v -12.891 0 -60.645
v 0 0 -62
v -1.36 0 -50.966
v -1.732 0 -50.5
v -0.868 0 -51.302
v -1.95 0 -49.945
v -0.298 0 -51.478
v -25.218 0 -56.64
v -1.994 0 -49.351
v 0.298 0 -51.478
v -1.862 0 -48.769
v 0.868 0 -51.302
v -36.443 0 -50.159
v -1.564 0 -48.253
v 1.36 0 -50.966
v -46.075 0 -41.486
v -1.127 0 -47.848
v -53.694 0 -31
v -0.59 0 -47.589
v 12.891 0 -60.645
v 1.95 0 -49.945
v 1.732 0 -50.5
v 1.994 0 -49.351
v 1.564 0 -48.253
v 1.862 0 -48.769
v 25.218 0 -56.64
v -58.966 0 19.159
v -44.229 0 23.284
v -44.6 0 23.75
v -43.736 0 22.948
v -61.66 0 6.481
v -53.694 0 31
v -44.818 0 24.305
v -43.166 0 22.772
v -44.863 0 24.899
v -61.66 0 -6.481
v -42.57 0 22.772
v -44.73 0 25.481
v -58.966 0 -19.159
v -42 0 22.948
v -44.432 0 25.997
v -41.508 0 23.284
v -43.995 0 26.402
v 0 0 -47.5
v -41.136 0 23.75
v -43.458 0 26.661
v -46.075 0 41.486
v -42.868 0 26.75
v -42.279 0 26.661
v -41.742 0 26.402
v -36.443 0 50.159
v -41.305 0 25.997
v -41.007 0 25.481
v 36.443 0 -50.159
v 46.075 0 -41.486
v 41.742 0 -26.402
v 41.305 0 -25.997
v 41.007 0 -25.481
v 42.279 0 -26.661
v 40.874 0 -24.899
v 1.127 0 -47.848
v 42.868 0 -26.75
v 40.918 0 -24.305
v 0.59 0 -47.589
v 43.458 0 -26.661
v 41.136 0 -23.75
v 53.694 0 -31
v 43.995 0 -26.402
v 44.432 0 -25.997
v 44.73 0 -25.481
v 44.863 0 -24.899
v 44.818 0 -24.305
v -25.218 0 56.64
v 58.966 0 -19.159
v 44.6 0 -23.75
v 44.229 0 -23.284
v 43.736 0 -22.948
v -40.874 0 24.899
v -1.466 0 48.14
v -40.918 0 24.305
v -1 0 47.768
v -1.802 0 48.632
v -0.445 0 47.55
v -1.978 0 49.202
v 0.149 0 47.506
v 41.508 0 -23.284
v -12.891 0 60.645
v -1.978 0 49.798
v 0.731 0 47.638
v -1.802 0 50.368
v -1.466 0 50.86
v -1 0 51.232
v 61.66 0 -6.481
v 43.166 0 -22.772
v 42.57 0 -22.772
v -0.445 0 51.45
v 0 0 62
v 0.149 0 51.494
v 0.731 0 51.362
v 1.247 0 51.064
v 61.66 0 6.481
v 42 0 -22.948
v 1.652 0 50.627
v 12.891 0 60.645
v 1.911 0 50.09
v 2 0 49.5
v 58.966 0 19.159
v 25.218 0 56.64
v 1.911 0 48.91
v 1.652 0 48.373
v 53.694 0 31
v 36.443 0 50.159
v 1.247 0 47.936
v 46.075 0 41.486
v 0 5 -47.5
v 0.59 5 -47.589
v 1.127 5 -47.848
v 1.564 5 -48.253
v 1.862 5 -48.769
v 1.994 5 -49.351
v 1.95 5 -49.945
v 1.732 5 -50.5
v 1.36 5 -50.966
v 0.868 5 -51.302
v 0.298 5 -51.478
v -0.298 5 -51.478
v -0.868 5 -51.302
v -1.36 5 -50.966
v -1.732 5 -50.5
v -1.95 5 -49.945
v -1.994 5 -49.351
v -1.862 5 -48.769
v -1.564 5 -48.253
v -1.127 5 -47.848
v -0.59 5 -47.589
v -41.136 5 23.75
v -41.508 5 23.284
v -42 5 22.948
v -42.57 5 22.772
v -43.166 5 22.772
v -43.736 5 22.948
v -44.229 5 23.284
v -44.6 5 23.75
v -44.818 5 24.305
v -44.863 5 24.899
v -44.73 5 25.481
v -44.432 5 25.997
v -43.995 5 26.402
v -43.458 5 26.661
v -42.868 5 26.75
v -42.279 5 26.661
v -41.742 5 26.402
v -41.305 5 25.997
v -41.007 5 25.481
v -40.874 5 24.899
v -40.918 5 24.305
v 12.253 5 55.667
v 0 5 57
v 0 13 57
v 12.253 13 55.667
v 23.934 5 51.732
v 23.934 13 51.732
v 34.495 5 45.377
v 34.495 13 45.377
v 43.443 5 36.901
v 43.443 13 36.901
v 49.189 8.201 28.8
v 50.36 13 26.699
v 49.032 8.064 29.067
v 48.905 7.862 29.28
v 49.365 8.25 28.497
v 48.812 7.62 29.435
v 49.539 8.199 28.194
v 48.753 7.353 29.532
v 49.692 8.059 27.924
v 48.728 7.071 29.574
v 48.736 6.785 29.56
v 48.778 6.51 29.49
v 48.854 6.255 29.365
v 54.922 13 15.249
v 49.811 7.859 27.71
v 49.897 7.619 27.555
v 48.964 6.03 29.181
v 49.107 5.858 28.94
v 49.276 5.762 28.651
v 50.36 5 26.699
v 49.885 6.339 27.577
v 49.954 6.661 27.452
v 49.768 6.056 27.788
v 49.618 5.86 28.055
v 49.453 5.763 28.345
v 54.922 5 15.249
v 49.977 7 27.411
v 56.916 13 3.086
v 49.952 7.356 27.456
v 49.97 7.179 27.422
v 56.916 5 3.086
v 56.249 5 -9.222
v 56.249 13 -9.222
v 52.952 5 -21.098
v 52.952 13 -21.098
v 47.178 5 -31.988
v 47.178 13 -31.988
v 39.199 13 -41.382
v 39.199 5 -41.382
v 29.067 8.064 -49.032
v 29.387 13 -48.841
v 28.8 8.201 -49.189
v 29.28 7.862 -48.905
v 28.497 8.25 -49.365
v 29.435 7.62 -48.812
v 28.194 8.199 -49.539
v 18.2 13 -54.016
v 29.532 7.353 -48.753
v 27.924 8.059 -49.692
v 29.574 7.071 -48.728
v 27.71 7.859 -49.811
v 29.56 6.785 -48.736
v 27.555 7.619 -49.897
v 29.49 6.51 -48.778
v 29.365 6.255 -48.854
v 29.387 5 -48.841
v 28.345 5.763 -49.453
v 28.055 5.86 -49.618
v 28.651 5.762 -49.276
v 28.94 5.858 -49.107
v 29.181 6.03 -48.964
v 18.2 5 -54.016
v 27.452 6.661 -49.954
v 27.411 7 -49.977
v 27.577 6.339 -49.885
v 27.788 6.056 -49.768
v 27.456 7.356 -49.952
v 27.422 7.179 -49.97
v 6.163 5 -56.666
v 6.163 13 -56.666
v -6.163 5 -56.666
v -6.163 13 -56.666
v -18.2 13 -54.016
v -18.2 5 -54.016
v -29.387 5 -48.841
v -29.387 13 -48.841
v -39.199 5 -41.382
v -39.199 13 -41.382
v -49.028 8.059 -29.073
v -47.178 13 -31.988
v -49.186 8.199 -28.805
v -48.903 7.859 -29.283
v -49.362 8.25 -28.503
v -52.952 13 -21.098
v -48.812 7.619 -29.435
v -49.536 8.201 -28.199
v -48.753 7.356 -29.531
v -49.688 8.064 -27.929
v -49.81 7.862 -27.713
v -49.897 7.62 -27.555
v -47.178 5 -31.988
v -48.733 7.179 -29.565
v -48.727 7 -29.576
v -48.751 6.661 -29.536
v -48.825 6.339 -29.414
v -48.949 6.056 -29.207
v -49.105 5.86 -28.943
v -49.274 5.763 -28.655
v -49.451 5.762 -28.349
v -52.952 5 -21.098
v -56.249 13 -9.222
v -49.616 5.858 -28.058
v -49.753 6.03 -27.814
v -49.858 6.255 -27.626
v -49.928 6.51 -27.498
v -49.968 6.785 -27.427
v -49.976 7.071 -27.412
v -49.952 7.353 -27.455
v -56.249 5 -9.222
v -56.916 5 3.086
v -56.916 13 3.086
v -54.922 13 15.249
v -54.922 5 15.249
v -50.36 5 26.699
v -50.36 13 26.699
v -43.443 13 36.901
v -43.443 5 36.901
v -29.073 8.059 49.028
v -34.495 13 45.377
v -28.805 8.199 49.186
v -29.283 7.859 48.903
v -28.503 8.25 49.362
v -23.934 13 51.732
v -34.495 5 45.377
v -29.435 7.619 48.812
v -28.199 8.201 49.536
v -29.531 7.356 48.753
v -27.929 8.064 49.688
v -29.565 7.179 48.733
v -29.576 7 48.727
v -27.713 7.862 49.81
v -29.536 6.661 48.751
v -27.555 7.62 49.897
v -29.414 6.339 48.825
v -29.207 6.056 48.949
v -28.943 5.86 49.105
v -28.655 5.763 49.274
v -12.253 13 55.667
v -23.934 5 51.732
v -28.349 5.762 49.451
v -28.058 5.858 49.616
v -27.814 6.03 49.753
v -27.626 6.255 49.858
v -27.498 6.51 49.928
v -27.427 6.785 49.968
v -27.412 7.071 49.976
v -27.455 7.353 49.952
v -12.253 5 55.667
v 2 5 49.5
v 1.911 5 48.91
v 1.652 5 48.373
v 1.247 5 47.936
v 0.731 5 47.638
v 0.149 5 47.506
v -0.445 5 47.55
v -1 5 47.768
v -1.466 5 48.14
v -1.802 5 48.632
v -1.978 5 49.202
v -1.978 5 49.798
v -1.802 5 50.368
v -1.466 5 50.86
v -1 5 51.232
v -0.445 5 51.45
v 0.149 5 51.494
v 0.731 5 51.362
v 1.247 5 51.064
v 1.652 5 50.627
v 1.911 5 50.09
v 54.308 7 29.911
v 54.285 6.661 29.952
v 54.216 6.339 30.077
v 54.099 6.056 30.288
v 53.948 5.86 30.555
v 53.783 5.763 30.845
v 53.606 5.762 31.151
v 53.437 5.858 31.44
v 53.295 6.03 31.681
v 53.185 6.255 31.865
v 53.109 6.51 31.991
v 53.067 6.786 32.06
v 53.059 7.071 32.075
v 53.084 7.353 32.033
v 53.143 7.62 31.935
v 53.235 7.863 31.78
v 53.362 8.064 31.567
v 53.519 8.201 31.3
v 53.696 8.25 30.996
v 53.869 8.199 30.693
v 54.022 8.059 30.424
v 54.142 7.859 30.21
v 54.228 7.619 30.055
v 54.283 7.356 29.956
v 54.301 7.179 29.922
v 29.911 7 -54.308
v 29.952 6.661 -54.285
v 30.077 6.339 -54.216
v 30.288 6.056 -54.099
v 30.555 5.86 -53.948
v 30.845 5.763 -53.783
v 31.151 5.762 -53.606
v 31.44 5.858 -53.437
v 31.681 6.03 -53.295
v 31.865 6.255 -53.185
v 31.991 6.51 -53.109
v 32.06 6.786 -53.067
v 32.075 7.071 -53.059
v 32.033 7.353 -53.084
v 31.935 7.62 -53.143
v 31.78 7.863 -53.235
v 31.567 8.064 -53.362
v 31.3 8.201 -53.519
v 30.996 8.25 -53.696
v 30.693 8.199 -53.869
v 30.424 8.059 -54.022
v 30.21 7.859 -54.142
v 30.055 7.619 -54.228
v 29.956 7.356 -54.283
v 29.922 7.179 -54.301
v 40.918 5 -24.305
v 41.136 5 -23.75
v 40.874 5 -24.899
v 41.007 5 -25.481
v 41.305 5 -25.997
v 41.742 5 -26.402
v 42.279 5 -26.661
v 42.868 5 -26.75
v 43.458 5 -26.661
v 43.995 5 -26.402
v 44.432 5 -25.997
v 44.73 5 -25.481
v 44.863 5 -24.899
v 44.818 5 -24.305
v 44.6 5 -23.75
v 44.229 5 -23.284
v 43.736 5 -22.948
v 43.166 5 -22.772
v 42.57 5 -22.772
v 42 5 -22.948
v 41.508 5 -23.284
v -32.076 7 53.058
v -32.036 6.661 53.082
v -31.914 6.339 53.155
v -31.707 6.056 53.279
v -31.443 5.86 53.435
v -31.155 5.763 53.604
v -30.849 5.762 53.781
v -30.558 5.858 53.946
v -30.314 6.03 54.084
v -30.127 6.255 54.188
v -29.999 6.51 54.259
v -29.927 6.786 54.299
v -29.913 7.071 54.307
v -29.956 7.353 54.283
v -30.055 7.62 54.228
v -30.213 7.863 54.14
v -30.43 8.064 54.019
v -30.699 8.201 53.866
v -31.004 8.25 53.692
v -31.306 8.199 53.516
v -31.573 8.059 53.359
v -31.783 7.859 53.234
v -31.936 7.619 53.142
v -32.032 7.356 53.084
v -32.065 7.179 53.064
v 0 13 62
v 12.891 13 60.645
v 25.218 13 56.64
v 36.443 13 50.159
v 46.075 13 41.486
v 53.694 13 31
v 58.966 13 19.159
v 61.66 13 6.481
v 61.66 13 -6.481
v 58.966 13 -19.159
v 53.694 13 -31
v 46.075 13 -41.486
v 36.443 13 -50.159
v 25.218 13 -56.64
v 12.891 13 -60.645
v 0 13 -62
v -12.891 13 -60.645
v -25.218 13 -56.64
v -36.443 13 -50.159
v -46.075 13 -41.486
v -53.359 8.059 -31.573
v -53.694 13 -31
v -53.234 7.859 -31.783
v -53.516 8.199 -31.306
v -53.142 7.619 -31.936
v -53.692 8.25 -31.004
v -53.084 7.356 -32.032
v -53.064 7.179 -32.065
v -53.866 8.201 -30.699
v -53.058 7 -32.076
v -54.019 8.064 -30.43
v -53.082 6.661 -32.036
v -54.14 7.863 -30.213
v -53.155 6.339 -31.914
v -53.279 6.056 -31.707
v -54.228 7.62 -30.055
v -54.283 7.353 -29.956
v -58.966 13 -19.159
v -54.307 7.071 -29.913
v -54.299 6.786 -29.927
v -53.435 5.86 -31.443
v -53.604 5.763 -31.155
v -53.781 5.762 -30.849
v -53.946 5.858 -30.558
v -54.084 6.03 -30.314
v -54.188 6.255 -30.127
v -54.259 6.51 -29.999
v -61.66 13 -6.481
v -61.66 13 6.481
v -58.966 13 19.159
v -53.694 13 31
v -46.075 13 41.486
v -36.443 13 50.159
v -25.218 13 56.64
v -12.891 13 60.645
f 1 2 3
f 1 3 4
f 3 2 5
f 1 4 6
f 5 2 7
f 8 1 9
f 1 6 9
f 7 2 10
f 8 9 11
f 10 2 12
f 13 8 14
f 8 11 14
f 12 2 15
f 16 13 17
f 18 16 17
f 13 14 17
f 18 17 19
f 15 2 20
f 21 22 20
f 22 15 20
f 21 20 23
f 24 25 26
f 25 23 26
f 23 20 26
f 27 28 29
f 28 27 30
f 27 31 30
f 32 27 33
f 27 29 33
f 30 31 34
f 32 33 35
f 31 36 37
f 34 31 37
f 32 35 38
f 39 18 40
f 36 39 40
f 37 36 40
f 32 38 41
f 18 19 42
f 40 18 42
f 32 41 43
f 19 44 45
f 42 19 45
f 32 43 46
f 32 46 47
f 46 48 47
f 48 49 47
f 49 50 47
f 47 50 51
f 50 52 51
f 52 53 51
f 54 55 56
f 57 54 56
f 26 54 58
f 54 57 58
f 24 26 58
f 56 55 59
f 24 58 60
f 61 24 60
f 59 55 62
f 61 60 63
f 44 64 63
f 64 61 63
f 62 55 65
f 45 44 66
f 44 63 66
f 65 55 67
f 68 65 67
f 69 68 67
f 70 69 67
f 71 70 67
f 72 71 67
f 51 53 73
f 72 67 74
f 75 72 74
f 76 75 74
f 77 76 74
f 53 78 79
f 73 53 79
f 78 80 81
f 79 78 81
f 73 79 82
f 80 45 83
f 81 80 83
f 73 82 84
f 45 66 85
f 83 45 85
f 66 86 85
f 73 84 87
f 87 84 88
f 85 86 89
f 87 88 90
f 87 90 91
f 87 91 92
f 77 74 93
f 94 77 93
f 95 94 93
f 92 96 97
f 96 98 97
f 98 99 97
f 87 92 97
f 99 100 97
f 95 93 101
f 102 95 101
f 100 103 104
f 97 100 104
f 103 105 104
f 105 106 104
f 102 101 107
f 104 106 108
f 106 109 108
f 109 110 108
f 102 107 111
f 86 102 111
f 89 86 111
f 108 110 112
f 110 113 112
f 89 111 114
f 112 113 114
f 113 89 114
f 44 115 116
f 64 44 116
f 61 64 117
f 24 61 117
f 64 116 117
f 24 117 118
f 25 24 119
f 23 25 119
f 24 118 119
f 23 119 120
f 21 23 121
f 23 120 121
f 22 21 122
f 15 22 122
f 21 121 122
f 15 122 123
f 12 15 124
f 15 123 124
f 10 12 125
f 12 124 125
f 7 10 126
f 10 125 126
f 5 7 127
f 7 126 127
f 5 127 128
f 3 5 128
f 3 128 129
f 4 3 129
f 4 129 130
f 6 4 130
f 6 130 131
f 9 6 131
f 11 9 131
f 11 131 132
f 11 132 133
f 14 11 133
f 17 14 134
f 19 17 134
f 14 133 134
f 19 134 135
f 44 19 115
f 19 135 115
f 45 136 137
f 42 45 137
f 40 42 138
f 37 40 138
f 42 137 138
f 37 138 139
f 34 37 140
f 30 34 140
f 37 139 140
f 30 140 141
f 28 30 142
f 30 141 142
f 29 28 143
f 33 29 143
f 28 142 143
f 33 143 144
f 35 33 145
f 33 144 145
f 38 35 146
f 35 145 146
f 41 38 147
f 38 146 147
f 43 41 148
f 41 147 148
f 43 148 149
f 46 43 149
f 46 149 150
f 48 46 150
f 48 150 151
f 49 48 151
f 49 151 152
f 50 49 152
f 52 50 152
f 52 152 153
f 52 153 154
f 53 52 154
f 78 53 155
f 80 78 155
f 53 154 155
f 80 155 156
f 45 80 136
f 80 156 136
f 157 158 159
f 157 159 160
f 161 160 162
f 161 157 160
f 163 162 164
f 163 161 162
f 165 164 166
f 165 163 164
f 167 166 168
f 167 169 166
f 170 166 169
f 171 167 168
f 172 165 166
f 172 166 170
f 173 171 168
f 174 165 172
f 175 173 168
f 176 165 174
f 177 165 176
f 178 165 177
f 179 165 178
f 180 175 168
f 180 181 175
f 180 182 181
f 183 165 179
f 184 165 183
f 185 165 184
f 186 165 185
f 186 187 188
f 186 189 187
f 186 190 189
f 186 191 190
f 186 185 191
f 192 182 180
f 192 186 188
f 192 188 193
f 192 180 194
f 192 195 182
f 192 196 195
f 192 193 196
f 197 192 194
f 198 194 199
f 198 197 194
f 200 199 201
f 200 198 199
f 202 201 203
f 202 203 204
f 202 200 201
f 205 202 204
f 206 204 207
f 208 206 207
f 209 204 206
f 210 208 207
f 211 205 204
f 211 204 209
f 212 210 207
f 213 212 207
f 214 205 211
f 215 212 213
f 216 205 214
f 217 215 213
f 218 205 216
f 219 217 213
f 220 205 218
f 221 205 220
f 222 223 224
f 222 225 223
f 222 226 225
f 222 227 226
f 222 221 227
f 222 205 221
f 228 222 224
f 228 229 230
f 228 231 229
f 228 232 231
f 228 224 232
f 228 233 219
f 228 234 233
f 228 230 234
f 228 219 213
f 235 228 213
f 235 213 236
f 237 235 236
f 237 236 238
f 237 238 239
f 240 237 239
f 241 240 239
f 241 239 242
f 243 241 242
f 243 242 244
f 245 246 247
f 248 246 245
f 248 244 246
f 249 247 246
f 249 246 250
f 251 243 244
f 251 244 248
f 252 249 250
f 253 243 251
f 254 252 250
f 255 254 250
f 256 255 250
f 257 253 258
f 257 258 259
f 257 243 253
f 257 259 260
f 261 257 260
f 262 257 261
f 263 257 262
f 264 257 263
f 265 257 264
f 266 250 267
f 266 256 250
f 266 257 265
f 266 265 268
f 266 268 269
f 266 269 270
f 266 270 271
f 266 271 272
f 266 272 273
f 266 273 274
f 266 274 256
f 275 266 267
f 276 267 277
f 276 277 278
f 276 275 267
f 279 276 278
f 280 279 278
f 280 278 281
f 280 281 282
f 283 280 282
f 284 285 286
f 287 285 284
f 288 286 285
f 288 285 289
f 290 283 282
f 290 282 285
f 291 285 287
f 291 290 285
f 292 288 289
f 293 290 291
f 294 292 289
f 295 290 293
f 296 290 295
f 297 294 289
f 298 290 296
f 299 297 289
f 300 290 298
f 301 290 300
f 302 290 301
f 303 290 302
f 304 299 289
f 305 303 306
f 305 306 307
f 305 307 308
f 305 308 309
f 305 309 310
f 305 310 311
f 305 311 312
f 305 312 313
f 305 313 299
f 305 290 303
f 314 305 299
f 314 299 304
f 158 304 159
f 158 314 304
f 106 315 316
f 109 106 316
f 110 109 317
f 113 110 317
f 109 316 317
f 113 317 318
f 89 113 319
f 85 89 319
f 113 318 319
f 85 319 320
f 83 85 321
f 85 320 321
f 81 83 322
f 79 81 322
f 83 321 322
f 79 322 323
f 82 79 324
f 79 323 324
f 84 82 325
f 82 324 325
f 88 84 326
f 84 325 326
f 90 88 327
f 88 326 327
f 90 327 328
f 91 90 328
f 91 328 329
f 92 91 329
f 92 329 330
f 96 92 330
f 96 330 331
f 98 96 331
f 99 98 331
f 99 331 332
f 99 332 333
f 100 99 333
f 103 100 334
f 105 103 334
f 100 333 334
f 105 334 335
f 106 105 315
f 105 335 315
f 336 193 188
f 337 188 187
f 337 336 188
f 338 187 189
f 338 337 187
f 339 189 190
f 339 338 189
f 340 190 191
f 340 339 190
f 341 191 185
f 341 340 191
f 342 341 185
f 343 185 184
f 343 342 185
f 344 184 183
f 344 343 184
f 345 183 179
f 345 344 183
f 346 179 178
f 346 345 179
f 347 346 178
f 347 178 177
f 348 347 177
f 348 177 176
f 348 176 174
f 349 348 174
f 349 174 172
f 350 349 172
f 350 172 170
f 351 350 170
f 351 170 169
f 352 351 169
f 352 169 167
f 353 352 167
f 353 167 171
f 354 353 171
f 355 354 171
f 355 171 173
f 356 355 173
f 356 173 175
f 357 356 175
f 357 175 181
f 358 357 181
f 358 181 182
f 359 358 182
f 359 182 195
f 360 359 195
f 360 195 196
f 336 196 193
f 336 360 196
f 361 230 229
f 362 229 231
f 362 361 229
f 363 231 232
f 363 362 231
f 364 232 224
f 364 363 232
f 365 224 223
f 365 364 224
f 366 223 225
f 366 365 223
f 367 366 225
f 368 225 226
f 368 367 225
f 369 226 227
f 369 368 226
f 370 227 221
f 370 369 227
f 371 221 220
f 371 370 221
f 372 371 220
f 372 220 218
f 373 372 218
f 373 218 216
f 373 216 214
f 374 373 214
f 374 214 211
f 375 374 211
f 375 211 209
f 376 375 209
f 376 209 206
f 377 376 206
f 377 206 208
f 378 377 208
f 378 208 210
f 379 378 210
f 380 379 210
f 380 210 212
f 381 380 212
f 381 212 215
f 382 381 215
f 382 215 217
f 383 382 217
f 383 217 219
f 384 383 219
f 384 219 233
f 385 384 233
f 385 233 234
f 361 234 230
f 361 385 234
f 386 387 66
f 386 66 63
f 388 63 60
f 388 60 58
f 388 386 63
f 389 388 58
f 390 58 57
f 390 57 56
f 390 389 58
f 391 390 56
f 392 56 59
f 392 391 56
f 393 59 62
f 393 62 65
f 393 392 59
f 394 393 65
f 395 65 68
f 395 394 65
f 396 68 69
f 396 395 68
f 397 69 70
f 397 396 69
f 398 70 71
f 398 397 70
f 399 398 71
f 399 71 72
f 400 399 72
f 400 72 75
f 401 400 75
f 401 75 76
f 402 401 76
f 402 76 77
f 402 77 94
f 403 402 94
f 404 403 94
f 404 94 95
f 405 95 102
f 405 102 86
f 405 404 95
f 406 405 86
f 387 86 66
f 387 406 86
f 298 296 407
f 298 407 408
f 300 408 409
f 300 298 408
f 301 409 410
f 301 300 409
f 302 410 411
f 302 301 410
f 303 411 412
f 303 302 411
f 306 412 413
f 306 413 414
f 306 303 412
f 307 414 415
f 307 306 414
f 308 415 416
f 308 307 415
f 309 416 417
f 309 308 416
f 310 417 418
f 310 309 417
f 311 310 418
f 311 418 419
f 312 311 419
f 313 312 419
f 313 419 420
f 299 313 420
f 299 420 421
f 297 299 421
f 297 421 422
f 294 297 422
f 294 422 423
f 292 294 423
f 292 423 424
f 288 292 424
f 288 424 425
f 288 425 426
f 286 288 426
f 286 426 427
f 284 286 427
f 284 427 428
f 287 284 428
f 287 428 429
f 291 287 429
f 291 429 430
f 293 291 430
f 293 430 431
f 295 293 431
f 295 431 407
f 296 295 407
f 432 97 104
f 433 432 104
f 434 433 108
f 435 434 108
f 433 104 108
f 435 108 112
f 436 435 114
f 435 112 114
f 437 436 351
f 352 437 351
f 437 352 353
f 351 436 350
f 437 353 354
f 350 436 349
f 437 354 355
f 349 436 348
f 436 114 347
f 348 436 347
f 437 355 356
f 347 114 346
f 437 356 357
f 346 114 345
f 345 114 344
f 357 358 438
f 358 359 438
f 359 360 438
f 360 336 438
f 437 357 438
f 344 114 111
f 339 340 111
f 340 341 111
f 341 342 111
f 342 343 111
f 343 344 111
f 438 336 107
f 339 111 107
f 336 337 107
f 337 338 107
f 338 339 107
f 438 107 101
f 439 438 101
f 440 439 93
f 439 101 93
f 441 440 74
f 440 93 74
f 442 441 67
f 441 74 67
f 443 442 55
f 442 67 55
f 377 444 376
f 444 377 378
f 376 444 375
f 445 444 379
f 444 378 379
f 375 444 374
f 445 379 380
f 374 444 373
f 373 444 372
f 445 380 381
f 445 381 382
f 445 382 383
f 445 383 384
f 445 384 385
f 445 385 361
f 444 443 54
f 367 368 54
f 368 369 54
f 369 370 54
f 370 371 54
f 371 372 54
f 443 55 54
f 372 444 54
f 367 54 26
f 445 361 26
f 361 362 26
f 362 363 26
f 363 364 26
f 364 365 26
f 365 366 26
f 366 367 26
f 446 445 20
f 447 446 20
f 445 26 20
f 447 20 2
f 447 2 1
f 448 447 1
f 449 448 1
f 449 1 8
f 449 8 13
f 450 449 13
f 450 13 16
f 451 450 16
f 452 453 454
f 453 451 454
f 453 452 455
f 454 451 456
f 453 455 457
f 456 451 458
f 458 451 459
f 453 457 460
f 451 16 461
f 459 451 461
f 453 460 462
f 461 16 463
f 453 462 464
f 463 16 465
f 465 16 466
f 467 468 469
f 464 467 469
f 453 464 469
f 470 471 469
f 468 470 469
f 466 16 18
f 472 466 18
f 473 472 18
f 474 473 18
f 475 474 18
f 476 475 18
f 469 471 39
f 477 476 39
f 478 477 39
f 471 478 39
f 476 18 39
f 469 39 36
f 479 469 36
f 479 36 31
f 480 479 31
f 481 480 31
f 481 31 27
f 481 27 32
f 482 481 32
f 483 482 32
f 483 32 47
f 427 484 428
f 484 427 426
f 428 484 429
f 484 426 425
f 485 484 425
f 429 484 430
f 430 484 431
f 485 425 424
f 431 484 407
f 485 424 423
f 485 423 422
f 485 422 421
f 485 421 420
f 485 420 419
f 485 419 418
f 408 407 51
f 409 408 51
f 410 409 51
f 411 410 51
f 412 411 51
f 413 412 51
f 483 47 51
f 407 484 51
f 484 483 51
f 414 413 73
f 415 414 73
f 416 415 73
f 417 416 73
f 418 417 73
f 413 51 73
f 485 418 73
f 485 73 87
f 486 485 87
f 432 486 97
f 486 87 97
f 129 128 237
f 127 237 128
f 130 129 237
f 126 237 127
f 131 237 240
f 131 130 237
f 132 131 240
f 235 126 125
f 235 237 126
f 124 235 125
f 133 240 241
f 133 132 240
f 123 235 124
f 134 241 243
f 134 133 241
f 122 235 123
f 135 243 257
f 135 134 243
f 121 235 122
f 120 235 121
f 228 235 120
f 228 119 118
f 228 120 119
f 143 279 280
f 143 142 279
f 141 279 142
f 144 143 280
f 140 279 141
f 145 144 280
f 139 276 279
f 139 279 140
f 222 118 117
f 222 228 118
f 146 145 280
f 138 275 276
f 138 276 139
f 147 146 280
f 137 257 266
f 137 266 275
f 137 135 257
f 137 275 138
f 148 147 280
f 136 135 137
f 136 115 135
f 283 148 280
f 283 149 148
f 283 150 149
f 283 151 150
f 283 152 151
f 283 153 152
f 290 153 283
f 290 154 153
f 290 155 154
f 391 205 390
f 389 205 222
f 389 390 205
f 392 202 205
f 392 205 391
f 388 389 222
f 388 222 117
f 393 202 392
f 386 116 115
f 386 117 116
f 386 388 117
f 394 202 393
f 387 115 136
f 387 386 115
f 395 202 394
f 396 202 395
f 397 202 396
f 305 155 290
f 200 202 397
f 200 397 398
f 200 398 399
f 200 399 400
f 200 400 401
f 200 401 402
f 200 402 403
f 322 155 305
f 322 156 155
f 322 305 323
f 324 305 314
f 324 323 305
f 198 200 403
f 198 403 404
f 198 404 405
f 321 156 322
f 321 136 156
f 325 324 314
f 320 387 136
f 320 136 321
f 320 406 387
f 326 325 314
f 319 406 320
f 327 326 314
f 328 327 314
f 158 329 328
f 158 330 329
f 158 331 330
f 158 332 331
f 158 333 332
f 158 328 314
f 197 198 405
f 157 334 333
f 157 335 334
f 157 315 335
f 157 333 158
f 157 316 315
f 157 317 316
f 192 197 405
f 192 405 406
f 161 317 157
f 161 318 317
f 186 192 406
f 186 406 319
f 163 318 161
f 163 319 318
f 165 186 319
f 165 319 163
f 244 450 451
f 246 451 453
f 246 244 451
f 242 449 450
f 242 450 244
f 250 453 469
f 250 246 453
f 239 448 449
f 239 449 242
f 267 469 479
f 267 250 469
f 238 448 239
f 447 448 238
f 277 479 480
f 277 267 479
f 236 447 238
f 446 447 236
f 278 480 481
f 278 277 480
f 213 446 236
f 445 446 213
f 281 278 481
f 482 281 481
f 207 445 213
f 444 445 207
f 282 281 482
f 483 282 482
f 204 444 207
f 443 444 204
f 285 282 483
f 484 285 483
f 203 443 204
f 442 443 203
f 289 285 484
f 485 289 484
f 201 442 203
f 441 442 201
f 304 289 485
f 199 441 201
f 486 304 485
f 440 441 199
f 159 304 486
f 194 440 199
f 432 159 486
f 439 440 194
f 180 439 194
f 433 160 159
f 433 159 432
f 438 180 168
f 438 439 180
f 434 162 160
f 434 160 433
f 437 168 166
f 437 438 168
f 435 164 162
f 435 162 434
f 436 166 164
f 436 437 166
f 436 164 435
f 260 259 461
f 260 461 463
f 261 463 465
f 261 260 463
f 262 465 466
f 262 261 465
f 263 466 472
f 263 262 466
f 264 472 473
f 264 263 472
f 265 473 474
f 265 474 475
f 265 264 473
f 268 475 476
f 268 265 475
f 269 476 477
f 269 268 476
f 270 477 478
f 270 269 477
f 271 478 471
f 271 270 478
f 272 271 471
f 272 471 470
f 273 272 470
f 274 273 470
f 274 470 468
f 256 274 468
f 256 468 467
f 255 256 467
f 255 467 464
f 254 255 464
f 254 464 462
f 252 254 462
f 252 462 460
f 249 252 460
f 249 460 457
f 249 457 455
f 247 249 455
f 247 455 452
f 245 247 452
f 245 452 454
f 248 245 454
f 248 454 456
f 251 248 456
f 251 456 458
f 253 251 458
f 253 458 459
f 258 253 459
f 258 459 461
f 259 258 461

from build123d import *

# Parameters (mm, degrees)
SKETCH1_R               = 62
BOSS_EXTRUDE1_DEPTH     = 5
SKETCH2_R               = 2
CUT_EXTRUDE1_DEPTH      = 5
CIRPATTERN1_COUNT       = 2
CIRPATTERN1_ANGLE       = 120
MIRROR1_COPY_1_SKETCH_R = 2
MIRROR1_COPY_1_DEPTH    = 5
SKETCH5_R               = 62
SKETCH5_R_2             = 57
BOSS_EXTRUDE2_DEPTH     = 8
CUT_EXTRUDE2_START      = -90
SKETCH6_R               = 1.25
CUT_EXTRUDE2_DEPTH      = 192
CIRPATTERN2_COUNT       = 2
CIRPATTERN2_ANGLE       = 90


with BuildPart() as part:
    # Sketch1 → Boss-Extrude1 (new body)
    with BuildSketch(Plane(origin=(0, 0, 0), x_dir=(1, 0, 0), z_dir=(0, 1, 0))):
        with Locations(Location((0, 0, 0), (0, 0, 270))):
            Circle(SKETCH1_R)
    extrude(amount=BOSS_EXTRUDE1_DEPTH)

    # Sketch2 → Cut-Extrude1 (cut)
    with BuildSketch(Plane(origin=(0, 5, 0), x_dir=(1, 0, 0), z_dir=(0, 1, 0))):
        with Locations(Location((0, 49.5, 0), (0, 0, 270))):
            Circle(SKETCH2_R)
    cut_extrude1 = extrude(amount=-CUT_EXTRUDE1_DEPTH, mode=Mode.SUBTRACT)

    # CirPattern1: Cut-Extrude1 ×2 about axis
    cirpattern1_axis = Axis((0, 5, 0), (0, 1, 0))
    for i in range(1, CIRPATTERN1_COUNT):
        add(cut_extrude1.rotate(cirpattern1_axis, i * CIRPATTERN1_ANGLE / (CIRPATTERN1_COUNT - 1)), mode=Mode.SUBTRACT)

    # Mirror1: Cut-Extrude1 across plane
    add(cut_extrude1.mirror(Plane(origin=(0, 0, 0), x_dir=(-0.49999999999999806, 0, 0.8660254037844398), z_dir=(-0.8660254037844398, 0, -0.49999999999999806))), mode=Mode.SUBTRACT)

    # Mirror1 copy 1 sketch → Mirror1 copy 1 (cut)
    with BuildSketch(Plane(origin=(0, 5, 0), x_dir=(1, 0, 0), z_dir=(0, 1, 0))):
        with Locations((0, -49.5)):
            Circle(MIRROR1_COPY_1_SKETCH_R)
    extrude(amount=-MIRROR1_COPY_1_DEPTH, mode=Mode.SUBTRACT)

    # Sketch5 → Boss-Extrude2 (add)
    with BuildSketch(Plane(origin=(0, 5, 0), x_dir=(1, 0, 0), z_dir=(0, 1, 0))):
        with Locations(Location((0, 0, 0), (0, 0, 270))):
            Circle(SKETCH5_R)
        with Locations(Location((0, 0, 0), (0, 0, 270))):
            Circle(SKETCH5_R_2, mode=Mode.SUBTRACT)
    extrude(amount=BOSS_EXTRUDE2_DEPTH)

    # Sketch6 → Cut-Extrude2 (cut)
    with BuildSketch(Plane(origin=(0, 0, 0), x_dir=(-0.49999999999999806, 0, 0.8660254037844398), z_dir=(-0.8660254037844398, 0, -0.49999999999999806)).offset(CUT_EXTRUDE2_START)):
        with Locations(Location((0, 7, 0), (0, 0, 180))):
            Circle(SKETCH6_R)
    cut_extrude2 = extrude(amount=CUT_EXTRUDE2_DEPTH, mode=Mode.SUBTRACT)

    # CirPattern2: Cut-Extrude2 ×2 about axis
    cirpattern2_axis = Axis((0, 13, 0), (0, 1, 0))
    for i in range(1, CIRPATTERN2_COUNT):
        add(cut_extrude2.rotate(cirpattern2_axis, i * CIRPATTERN2_ANGLE / (CIRPATTERN2_COUNT - 1)), mode=Mode.SUBTRACT)


solid = part.part
